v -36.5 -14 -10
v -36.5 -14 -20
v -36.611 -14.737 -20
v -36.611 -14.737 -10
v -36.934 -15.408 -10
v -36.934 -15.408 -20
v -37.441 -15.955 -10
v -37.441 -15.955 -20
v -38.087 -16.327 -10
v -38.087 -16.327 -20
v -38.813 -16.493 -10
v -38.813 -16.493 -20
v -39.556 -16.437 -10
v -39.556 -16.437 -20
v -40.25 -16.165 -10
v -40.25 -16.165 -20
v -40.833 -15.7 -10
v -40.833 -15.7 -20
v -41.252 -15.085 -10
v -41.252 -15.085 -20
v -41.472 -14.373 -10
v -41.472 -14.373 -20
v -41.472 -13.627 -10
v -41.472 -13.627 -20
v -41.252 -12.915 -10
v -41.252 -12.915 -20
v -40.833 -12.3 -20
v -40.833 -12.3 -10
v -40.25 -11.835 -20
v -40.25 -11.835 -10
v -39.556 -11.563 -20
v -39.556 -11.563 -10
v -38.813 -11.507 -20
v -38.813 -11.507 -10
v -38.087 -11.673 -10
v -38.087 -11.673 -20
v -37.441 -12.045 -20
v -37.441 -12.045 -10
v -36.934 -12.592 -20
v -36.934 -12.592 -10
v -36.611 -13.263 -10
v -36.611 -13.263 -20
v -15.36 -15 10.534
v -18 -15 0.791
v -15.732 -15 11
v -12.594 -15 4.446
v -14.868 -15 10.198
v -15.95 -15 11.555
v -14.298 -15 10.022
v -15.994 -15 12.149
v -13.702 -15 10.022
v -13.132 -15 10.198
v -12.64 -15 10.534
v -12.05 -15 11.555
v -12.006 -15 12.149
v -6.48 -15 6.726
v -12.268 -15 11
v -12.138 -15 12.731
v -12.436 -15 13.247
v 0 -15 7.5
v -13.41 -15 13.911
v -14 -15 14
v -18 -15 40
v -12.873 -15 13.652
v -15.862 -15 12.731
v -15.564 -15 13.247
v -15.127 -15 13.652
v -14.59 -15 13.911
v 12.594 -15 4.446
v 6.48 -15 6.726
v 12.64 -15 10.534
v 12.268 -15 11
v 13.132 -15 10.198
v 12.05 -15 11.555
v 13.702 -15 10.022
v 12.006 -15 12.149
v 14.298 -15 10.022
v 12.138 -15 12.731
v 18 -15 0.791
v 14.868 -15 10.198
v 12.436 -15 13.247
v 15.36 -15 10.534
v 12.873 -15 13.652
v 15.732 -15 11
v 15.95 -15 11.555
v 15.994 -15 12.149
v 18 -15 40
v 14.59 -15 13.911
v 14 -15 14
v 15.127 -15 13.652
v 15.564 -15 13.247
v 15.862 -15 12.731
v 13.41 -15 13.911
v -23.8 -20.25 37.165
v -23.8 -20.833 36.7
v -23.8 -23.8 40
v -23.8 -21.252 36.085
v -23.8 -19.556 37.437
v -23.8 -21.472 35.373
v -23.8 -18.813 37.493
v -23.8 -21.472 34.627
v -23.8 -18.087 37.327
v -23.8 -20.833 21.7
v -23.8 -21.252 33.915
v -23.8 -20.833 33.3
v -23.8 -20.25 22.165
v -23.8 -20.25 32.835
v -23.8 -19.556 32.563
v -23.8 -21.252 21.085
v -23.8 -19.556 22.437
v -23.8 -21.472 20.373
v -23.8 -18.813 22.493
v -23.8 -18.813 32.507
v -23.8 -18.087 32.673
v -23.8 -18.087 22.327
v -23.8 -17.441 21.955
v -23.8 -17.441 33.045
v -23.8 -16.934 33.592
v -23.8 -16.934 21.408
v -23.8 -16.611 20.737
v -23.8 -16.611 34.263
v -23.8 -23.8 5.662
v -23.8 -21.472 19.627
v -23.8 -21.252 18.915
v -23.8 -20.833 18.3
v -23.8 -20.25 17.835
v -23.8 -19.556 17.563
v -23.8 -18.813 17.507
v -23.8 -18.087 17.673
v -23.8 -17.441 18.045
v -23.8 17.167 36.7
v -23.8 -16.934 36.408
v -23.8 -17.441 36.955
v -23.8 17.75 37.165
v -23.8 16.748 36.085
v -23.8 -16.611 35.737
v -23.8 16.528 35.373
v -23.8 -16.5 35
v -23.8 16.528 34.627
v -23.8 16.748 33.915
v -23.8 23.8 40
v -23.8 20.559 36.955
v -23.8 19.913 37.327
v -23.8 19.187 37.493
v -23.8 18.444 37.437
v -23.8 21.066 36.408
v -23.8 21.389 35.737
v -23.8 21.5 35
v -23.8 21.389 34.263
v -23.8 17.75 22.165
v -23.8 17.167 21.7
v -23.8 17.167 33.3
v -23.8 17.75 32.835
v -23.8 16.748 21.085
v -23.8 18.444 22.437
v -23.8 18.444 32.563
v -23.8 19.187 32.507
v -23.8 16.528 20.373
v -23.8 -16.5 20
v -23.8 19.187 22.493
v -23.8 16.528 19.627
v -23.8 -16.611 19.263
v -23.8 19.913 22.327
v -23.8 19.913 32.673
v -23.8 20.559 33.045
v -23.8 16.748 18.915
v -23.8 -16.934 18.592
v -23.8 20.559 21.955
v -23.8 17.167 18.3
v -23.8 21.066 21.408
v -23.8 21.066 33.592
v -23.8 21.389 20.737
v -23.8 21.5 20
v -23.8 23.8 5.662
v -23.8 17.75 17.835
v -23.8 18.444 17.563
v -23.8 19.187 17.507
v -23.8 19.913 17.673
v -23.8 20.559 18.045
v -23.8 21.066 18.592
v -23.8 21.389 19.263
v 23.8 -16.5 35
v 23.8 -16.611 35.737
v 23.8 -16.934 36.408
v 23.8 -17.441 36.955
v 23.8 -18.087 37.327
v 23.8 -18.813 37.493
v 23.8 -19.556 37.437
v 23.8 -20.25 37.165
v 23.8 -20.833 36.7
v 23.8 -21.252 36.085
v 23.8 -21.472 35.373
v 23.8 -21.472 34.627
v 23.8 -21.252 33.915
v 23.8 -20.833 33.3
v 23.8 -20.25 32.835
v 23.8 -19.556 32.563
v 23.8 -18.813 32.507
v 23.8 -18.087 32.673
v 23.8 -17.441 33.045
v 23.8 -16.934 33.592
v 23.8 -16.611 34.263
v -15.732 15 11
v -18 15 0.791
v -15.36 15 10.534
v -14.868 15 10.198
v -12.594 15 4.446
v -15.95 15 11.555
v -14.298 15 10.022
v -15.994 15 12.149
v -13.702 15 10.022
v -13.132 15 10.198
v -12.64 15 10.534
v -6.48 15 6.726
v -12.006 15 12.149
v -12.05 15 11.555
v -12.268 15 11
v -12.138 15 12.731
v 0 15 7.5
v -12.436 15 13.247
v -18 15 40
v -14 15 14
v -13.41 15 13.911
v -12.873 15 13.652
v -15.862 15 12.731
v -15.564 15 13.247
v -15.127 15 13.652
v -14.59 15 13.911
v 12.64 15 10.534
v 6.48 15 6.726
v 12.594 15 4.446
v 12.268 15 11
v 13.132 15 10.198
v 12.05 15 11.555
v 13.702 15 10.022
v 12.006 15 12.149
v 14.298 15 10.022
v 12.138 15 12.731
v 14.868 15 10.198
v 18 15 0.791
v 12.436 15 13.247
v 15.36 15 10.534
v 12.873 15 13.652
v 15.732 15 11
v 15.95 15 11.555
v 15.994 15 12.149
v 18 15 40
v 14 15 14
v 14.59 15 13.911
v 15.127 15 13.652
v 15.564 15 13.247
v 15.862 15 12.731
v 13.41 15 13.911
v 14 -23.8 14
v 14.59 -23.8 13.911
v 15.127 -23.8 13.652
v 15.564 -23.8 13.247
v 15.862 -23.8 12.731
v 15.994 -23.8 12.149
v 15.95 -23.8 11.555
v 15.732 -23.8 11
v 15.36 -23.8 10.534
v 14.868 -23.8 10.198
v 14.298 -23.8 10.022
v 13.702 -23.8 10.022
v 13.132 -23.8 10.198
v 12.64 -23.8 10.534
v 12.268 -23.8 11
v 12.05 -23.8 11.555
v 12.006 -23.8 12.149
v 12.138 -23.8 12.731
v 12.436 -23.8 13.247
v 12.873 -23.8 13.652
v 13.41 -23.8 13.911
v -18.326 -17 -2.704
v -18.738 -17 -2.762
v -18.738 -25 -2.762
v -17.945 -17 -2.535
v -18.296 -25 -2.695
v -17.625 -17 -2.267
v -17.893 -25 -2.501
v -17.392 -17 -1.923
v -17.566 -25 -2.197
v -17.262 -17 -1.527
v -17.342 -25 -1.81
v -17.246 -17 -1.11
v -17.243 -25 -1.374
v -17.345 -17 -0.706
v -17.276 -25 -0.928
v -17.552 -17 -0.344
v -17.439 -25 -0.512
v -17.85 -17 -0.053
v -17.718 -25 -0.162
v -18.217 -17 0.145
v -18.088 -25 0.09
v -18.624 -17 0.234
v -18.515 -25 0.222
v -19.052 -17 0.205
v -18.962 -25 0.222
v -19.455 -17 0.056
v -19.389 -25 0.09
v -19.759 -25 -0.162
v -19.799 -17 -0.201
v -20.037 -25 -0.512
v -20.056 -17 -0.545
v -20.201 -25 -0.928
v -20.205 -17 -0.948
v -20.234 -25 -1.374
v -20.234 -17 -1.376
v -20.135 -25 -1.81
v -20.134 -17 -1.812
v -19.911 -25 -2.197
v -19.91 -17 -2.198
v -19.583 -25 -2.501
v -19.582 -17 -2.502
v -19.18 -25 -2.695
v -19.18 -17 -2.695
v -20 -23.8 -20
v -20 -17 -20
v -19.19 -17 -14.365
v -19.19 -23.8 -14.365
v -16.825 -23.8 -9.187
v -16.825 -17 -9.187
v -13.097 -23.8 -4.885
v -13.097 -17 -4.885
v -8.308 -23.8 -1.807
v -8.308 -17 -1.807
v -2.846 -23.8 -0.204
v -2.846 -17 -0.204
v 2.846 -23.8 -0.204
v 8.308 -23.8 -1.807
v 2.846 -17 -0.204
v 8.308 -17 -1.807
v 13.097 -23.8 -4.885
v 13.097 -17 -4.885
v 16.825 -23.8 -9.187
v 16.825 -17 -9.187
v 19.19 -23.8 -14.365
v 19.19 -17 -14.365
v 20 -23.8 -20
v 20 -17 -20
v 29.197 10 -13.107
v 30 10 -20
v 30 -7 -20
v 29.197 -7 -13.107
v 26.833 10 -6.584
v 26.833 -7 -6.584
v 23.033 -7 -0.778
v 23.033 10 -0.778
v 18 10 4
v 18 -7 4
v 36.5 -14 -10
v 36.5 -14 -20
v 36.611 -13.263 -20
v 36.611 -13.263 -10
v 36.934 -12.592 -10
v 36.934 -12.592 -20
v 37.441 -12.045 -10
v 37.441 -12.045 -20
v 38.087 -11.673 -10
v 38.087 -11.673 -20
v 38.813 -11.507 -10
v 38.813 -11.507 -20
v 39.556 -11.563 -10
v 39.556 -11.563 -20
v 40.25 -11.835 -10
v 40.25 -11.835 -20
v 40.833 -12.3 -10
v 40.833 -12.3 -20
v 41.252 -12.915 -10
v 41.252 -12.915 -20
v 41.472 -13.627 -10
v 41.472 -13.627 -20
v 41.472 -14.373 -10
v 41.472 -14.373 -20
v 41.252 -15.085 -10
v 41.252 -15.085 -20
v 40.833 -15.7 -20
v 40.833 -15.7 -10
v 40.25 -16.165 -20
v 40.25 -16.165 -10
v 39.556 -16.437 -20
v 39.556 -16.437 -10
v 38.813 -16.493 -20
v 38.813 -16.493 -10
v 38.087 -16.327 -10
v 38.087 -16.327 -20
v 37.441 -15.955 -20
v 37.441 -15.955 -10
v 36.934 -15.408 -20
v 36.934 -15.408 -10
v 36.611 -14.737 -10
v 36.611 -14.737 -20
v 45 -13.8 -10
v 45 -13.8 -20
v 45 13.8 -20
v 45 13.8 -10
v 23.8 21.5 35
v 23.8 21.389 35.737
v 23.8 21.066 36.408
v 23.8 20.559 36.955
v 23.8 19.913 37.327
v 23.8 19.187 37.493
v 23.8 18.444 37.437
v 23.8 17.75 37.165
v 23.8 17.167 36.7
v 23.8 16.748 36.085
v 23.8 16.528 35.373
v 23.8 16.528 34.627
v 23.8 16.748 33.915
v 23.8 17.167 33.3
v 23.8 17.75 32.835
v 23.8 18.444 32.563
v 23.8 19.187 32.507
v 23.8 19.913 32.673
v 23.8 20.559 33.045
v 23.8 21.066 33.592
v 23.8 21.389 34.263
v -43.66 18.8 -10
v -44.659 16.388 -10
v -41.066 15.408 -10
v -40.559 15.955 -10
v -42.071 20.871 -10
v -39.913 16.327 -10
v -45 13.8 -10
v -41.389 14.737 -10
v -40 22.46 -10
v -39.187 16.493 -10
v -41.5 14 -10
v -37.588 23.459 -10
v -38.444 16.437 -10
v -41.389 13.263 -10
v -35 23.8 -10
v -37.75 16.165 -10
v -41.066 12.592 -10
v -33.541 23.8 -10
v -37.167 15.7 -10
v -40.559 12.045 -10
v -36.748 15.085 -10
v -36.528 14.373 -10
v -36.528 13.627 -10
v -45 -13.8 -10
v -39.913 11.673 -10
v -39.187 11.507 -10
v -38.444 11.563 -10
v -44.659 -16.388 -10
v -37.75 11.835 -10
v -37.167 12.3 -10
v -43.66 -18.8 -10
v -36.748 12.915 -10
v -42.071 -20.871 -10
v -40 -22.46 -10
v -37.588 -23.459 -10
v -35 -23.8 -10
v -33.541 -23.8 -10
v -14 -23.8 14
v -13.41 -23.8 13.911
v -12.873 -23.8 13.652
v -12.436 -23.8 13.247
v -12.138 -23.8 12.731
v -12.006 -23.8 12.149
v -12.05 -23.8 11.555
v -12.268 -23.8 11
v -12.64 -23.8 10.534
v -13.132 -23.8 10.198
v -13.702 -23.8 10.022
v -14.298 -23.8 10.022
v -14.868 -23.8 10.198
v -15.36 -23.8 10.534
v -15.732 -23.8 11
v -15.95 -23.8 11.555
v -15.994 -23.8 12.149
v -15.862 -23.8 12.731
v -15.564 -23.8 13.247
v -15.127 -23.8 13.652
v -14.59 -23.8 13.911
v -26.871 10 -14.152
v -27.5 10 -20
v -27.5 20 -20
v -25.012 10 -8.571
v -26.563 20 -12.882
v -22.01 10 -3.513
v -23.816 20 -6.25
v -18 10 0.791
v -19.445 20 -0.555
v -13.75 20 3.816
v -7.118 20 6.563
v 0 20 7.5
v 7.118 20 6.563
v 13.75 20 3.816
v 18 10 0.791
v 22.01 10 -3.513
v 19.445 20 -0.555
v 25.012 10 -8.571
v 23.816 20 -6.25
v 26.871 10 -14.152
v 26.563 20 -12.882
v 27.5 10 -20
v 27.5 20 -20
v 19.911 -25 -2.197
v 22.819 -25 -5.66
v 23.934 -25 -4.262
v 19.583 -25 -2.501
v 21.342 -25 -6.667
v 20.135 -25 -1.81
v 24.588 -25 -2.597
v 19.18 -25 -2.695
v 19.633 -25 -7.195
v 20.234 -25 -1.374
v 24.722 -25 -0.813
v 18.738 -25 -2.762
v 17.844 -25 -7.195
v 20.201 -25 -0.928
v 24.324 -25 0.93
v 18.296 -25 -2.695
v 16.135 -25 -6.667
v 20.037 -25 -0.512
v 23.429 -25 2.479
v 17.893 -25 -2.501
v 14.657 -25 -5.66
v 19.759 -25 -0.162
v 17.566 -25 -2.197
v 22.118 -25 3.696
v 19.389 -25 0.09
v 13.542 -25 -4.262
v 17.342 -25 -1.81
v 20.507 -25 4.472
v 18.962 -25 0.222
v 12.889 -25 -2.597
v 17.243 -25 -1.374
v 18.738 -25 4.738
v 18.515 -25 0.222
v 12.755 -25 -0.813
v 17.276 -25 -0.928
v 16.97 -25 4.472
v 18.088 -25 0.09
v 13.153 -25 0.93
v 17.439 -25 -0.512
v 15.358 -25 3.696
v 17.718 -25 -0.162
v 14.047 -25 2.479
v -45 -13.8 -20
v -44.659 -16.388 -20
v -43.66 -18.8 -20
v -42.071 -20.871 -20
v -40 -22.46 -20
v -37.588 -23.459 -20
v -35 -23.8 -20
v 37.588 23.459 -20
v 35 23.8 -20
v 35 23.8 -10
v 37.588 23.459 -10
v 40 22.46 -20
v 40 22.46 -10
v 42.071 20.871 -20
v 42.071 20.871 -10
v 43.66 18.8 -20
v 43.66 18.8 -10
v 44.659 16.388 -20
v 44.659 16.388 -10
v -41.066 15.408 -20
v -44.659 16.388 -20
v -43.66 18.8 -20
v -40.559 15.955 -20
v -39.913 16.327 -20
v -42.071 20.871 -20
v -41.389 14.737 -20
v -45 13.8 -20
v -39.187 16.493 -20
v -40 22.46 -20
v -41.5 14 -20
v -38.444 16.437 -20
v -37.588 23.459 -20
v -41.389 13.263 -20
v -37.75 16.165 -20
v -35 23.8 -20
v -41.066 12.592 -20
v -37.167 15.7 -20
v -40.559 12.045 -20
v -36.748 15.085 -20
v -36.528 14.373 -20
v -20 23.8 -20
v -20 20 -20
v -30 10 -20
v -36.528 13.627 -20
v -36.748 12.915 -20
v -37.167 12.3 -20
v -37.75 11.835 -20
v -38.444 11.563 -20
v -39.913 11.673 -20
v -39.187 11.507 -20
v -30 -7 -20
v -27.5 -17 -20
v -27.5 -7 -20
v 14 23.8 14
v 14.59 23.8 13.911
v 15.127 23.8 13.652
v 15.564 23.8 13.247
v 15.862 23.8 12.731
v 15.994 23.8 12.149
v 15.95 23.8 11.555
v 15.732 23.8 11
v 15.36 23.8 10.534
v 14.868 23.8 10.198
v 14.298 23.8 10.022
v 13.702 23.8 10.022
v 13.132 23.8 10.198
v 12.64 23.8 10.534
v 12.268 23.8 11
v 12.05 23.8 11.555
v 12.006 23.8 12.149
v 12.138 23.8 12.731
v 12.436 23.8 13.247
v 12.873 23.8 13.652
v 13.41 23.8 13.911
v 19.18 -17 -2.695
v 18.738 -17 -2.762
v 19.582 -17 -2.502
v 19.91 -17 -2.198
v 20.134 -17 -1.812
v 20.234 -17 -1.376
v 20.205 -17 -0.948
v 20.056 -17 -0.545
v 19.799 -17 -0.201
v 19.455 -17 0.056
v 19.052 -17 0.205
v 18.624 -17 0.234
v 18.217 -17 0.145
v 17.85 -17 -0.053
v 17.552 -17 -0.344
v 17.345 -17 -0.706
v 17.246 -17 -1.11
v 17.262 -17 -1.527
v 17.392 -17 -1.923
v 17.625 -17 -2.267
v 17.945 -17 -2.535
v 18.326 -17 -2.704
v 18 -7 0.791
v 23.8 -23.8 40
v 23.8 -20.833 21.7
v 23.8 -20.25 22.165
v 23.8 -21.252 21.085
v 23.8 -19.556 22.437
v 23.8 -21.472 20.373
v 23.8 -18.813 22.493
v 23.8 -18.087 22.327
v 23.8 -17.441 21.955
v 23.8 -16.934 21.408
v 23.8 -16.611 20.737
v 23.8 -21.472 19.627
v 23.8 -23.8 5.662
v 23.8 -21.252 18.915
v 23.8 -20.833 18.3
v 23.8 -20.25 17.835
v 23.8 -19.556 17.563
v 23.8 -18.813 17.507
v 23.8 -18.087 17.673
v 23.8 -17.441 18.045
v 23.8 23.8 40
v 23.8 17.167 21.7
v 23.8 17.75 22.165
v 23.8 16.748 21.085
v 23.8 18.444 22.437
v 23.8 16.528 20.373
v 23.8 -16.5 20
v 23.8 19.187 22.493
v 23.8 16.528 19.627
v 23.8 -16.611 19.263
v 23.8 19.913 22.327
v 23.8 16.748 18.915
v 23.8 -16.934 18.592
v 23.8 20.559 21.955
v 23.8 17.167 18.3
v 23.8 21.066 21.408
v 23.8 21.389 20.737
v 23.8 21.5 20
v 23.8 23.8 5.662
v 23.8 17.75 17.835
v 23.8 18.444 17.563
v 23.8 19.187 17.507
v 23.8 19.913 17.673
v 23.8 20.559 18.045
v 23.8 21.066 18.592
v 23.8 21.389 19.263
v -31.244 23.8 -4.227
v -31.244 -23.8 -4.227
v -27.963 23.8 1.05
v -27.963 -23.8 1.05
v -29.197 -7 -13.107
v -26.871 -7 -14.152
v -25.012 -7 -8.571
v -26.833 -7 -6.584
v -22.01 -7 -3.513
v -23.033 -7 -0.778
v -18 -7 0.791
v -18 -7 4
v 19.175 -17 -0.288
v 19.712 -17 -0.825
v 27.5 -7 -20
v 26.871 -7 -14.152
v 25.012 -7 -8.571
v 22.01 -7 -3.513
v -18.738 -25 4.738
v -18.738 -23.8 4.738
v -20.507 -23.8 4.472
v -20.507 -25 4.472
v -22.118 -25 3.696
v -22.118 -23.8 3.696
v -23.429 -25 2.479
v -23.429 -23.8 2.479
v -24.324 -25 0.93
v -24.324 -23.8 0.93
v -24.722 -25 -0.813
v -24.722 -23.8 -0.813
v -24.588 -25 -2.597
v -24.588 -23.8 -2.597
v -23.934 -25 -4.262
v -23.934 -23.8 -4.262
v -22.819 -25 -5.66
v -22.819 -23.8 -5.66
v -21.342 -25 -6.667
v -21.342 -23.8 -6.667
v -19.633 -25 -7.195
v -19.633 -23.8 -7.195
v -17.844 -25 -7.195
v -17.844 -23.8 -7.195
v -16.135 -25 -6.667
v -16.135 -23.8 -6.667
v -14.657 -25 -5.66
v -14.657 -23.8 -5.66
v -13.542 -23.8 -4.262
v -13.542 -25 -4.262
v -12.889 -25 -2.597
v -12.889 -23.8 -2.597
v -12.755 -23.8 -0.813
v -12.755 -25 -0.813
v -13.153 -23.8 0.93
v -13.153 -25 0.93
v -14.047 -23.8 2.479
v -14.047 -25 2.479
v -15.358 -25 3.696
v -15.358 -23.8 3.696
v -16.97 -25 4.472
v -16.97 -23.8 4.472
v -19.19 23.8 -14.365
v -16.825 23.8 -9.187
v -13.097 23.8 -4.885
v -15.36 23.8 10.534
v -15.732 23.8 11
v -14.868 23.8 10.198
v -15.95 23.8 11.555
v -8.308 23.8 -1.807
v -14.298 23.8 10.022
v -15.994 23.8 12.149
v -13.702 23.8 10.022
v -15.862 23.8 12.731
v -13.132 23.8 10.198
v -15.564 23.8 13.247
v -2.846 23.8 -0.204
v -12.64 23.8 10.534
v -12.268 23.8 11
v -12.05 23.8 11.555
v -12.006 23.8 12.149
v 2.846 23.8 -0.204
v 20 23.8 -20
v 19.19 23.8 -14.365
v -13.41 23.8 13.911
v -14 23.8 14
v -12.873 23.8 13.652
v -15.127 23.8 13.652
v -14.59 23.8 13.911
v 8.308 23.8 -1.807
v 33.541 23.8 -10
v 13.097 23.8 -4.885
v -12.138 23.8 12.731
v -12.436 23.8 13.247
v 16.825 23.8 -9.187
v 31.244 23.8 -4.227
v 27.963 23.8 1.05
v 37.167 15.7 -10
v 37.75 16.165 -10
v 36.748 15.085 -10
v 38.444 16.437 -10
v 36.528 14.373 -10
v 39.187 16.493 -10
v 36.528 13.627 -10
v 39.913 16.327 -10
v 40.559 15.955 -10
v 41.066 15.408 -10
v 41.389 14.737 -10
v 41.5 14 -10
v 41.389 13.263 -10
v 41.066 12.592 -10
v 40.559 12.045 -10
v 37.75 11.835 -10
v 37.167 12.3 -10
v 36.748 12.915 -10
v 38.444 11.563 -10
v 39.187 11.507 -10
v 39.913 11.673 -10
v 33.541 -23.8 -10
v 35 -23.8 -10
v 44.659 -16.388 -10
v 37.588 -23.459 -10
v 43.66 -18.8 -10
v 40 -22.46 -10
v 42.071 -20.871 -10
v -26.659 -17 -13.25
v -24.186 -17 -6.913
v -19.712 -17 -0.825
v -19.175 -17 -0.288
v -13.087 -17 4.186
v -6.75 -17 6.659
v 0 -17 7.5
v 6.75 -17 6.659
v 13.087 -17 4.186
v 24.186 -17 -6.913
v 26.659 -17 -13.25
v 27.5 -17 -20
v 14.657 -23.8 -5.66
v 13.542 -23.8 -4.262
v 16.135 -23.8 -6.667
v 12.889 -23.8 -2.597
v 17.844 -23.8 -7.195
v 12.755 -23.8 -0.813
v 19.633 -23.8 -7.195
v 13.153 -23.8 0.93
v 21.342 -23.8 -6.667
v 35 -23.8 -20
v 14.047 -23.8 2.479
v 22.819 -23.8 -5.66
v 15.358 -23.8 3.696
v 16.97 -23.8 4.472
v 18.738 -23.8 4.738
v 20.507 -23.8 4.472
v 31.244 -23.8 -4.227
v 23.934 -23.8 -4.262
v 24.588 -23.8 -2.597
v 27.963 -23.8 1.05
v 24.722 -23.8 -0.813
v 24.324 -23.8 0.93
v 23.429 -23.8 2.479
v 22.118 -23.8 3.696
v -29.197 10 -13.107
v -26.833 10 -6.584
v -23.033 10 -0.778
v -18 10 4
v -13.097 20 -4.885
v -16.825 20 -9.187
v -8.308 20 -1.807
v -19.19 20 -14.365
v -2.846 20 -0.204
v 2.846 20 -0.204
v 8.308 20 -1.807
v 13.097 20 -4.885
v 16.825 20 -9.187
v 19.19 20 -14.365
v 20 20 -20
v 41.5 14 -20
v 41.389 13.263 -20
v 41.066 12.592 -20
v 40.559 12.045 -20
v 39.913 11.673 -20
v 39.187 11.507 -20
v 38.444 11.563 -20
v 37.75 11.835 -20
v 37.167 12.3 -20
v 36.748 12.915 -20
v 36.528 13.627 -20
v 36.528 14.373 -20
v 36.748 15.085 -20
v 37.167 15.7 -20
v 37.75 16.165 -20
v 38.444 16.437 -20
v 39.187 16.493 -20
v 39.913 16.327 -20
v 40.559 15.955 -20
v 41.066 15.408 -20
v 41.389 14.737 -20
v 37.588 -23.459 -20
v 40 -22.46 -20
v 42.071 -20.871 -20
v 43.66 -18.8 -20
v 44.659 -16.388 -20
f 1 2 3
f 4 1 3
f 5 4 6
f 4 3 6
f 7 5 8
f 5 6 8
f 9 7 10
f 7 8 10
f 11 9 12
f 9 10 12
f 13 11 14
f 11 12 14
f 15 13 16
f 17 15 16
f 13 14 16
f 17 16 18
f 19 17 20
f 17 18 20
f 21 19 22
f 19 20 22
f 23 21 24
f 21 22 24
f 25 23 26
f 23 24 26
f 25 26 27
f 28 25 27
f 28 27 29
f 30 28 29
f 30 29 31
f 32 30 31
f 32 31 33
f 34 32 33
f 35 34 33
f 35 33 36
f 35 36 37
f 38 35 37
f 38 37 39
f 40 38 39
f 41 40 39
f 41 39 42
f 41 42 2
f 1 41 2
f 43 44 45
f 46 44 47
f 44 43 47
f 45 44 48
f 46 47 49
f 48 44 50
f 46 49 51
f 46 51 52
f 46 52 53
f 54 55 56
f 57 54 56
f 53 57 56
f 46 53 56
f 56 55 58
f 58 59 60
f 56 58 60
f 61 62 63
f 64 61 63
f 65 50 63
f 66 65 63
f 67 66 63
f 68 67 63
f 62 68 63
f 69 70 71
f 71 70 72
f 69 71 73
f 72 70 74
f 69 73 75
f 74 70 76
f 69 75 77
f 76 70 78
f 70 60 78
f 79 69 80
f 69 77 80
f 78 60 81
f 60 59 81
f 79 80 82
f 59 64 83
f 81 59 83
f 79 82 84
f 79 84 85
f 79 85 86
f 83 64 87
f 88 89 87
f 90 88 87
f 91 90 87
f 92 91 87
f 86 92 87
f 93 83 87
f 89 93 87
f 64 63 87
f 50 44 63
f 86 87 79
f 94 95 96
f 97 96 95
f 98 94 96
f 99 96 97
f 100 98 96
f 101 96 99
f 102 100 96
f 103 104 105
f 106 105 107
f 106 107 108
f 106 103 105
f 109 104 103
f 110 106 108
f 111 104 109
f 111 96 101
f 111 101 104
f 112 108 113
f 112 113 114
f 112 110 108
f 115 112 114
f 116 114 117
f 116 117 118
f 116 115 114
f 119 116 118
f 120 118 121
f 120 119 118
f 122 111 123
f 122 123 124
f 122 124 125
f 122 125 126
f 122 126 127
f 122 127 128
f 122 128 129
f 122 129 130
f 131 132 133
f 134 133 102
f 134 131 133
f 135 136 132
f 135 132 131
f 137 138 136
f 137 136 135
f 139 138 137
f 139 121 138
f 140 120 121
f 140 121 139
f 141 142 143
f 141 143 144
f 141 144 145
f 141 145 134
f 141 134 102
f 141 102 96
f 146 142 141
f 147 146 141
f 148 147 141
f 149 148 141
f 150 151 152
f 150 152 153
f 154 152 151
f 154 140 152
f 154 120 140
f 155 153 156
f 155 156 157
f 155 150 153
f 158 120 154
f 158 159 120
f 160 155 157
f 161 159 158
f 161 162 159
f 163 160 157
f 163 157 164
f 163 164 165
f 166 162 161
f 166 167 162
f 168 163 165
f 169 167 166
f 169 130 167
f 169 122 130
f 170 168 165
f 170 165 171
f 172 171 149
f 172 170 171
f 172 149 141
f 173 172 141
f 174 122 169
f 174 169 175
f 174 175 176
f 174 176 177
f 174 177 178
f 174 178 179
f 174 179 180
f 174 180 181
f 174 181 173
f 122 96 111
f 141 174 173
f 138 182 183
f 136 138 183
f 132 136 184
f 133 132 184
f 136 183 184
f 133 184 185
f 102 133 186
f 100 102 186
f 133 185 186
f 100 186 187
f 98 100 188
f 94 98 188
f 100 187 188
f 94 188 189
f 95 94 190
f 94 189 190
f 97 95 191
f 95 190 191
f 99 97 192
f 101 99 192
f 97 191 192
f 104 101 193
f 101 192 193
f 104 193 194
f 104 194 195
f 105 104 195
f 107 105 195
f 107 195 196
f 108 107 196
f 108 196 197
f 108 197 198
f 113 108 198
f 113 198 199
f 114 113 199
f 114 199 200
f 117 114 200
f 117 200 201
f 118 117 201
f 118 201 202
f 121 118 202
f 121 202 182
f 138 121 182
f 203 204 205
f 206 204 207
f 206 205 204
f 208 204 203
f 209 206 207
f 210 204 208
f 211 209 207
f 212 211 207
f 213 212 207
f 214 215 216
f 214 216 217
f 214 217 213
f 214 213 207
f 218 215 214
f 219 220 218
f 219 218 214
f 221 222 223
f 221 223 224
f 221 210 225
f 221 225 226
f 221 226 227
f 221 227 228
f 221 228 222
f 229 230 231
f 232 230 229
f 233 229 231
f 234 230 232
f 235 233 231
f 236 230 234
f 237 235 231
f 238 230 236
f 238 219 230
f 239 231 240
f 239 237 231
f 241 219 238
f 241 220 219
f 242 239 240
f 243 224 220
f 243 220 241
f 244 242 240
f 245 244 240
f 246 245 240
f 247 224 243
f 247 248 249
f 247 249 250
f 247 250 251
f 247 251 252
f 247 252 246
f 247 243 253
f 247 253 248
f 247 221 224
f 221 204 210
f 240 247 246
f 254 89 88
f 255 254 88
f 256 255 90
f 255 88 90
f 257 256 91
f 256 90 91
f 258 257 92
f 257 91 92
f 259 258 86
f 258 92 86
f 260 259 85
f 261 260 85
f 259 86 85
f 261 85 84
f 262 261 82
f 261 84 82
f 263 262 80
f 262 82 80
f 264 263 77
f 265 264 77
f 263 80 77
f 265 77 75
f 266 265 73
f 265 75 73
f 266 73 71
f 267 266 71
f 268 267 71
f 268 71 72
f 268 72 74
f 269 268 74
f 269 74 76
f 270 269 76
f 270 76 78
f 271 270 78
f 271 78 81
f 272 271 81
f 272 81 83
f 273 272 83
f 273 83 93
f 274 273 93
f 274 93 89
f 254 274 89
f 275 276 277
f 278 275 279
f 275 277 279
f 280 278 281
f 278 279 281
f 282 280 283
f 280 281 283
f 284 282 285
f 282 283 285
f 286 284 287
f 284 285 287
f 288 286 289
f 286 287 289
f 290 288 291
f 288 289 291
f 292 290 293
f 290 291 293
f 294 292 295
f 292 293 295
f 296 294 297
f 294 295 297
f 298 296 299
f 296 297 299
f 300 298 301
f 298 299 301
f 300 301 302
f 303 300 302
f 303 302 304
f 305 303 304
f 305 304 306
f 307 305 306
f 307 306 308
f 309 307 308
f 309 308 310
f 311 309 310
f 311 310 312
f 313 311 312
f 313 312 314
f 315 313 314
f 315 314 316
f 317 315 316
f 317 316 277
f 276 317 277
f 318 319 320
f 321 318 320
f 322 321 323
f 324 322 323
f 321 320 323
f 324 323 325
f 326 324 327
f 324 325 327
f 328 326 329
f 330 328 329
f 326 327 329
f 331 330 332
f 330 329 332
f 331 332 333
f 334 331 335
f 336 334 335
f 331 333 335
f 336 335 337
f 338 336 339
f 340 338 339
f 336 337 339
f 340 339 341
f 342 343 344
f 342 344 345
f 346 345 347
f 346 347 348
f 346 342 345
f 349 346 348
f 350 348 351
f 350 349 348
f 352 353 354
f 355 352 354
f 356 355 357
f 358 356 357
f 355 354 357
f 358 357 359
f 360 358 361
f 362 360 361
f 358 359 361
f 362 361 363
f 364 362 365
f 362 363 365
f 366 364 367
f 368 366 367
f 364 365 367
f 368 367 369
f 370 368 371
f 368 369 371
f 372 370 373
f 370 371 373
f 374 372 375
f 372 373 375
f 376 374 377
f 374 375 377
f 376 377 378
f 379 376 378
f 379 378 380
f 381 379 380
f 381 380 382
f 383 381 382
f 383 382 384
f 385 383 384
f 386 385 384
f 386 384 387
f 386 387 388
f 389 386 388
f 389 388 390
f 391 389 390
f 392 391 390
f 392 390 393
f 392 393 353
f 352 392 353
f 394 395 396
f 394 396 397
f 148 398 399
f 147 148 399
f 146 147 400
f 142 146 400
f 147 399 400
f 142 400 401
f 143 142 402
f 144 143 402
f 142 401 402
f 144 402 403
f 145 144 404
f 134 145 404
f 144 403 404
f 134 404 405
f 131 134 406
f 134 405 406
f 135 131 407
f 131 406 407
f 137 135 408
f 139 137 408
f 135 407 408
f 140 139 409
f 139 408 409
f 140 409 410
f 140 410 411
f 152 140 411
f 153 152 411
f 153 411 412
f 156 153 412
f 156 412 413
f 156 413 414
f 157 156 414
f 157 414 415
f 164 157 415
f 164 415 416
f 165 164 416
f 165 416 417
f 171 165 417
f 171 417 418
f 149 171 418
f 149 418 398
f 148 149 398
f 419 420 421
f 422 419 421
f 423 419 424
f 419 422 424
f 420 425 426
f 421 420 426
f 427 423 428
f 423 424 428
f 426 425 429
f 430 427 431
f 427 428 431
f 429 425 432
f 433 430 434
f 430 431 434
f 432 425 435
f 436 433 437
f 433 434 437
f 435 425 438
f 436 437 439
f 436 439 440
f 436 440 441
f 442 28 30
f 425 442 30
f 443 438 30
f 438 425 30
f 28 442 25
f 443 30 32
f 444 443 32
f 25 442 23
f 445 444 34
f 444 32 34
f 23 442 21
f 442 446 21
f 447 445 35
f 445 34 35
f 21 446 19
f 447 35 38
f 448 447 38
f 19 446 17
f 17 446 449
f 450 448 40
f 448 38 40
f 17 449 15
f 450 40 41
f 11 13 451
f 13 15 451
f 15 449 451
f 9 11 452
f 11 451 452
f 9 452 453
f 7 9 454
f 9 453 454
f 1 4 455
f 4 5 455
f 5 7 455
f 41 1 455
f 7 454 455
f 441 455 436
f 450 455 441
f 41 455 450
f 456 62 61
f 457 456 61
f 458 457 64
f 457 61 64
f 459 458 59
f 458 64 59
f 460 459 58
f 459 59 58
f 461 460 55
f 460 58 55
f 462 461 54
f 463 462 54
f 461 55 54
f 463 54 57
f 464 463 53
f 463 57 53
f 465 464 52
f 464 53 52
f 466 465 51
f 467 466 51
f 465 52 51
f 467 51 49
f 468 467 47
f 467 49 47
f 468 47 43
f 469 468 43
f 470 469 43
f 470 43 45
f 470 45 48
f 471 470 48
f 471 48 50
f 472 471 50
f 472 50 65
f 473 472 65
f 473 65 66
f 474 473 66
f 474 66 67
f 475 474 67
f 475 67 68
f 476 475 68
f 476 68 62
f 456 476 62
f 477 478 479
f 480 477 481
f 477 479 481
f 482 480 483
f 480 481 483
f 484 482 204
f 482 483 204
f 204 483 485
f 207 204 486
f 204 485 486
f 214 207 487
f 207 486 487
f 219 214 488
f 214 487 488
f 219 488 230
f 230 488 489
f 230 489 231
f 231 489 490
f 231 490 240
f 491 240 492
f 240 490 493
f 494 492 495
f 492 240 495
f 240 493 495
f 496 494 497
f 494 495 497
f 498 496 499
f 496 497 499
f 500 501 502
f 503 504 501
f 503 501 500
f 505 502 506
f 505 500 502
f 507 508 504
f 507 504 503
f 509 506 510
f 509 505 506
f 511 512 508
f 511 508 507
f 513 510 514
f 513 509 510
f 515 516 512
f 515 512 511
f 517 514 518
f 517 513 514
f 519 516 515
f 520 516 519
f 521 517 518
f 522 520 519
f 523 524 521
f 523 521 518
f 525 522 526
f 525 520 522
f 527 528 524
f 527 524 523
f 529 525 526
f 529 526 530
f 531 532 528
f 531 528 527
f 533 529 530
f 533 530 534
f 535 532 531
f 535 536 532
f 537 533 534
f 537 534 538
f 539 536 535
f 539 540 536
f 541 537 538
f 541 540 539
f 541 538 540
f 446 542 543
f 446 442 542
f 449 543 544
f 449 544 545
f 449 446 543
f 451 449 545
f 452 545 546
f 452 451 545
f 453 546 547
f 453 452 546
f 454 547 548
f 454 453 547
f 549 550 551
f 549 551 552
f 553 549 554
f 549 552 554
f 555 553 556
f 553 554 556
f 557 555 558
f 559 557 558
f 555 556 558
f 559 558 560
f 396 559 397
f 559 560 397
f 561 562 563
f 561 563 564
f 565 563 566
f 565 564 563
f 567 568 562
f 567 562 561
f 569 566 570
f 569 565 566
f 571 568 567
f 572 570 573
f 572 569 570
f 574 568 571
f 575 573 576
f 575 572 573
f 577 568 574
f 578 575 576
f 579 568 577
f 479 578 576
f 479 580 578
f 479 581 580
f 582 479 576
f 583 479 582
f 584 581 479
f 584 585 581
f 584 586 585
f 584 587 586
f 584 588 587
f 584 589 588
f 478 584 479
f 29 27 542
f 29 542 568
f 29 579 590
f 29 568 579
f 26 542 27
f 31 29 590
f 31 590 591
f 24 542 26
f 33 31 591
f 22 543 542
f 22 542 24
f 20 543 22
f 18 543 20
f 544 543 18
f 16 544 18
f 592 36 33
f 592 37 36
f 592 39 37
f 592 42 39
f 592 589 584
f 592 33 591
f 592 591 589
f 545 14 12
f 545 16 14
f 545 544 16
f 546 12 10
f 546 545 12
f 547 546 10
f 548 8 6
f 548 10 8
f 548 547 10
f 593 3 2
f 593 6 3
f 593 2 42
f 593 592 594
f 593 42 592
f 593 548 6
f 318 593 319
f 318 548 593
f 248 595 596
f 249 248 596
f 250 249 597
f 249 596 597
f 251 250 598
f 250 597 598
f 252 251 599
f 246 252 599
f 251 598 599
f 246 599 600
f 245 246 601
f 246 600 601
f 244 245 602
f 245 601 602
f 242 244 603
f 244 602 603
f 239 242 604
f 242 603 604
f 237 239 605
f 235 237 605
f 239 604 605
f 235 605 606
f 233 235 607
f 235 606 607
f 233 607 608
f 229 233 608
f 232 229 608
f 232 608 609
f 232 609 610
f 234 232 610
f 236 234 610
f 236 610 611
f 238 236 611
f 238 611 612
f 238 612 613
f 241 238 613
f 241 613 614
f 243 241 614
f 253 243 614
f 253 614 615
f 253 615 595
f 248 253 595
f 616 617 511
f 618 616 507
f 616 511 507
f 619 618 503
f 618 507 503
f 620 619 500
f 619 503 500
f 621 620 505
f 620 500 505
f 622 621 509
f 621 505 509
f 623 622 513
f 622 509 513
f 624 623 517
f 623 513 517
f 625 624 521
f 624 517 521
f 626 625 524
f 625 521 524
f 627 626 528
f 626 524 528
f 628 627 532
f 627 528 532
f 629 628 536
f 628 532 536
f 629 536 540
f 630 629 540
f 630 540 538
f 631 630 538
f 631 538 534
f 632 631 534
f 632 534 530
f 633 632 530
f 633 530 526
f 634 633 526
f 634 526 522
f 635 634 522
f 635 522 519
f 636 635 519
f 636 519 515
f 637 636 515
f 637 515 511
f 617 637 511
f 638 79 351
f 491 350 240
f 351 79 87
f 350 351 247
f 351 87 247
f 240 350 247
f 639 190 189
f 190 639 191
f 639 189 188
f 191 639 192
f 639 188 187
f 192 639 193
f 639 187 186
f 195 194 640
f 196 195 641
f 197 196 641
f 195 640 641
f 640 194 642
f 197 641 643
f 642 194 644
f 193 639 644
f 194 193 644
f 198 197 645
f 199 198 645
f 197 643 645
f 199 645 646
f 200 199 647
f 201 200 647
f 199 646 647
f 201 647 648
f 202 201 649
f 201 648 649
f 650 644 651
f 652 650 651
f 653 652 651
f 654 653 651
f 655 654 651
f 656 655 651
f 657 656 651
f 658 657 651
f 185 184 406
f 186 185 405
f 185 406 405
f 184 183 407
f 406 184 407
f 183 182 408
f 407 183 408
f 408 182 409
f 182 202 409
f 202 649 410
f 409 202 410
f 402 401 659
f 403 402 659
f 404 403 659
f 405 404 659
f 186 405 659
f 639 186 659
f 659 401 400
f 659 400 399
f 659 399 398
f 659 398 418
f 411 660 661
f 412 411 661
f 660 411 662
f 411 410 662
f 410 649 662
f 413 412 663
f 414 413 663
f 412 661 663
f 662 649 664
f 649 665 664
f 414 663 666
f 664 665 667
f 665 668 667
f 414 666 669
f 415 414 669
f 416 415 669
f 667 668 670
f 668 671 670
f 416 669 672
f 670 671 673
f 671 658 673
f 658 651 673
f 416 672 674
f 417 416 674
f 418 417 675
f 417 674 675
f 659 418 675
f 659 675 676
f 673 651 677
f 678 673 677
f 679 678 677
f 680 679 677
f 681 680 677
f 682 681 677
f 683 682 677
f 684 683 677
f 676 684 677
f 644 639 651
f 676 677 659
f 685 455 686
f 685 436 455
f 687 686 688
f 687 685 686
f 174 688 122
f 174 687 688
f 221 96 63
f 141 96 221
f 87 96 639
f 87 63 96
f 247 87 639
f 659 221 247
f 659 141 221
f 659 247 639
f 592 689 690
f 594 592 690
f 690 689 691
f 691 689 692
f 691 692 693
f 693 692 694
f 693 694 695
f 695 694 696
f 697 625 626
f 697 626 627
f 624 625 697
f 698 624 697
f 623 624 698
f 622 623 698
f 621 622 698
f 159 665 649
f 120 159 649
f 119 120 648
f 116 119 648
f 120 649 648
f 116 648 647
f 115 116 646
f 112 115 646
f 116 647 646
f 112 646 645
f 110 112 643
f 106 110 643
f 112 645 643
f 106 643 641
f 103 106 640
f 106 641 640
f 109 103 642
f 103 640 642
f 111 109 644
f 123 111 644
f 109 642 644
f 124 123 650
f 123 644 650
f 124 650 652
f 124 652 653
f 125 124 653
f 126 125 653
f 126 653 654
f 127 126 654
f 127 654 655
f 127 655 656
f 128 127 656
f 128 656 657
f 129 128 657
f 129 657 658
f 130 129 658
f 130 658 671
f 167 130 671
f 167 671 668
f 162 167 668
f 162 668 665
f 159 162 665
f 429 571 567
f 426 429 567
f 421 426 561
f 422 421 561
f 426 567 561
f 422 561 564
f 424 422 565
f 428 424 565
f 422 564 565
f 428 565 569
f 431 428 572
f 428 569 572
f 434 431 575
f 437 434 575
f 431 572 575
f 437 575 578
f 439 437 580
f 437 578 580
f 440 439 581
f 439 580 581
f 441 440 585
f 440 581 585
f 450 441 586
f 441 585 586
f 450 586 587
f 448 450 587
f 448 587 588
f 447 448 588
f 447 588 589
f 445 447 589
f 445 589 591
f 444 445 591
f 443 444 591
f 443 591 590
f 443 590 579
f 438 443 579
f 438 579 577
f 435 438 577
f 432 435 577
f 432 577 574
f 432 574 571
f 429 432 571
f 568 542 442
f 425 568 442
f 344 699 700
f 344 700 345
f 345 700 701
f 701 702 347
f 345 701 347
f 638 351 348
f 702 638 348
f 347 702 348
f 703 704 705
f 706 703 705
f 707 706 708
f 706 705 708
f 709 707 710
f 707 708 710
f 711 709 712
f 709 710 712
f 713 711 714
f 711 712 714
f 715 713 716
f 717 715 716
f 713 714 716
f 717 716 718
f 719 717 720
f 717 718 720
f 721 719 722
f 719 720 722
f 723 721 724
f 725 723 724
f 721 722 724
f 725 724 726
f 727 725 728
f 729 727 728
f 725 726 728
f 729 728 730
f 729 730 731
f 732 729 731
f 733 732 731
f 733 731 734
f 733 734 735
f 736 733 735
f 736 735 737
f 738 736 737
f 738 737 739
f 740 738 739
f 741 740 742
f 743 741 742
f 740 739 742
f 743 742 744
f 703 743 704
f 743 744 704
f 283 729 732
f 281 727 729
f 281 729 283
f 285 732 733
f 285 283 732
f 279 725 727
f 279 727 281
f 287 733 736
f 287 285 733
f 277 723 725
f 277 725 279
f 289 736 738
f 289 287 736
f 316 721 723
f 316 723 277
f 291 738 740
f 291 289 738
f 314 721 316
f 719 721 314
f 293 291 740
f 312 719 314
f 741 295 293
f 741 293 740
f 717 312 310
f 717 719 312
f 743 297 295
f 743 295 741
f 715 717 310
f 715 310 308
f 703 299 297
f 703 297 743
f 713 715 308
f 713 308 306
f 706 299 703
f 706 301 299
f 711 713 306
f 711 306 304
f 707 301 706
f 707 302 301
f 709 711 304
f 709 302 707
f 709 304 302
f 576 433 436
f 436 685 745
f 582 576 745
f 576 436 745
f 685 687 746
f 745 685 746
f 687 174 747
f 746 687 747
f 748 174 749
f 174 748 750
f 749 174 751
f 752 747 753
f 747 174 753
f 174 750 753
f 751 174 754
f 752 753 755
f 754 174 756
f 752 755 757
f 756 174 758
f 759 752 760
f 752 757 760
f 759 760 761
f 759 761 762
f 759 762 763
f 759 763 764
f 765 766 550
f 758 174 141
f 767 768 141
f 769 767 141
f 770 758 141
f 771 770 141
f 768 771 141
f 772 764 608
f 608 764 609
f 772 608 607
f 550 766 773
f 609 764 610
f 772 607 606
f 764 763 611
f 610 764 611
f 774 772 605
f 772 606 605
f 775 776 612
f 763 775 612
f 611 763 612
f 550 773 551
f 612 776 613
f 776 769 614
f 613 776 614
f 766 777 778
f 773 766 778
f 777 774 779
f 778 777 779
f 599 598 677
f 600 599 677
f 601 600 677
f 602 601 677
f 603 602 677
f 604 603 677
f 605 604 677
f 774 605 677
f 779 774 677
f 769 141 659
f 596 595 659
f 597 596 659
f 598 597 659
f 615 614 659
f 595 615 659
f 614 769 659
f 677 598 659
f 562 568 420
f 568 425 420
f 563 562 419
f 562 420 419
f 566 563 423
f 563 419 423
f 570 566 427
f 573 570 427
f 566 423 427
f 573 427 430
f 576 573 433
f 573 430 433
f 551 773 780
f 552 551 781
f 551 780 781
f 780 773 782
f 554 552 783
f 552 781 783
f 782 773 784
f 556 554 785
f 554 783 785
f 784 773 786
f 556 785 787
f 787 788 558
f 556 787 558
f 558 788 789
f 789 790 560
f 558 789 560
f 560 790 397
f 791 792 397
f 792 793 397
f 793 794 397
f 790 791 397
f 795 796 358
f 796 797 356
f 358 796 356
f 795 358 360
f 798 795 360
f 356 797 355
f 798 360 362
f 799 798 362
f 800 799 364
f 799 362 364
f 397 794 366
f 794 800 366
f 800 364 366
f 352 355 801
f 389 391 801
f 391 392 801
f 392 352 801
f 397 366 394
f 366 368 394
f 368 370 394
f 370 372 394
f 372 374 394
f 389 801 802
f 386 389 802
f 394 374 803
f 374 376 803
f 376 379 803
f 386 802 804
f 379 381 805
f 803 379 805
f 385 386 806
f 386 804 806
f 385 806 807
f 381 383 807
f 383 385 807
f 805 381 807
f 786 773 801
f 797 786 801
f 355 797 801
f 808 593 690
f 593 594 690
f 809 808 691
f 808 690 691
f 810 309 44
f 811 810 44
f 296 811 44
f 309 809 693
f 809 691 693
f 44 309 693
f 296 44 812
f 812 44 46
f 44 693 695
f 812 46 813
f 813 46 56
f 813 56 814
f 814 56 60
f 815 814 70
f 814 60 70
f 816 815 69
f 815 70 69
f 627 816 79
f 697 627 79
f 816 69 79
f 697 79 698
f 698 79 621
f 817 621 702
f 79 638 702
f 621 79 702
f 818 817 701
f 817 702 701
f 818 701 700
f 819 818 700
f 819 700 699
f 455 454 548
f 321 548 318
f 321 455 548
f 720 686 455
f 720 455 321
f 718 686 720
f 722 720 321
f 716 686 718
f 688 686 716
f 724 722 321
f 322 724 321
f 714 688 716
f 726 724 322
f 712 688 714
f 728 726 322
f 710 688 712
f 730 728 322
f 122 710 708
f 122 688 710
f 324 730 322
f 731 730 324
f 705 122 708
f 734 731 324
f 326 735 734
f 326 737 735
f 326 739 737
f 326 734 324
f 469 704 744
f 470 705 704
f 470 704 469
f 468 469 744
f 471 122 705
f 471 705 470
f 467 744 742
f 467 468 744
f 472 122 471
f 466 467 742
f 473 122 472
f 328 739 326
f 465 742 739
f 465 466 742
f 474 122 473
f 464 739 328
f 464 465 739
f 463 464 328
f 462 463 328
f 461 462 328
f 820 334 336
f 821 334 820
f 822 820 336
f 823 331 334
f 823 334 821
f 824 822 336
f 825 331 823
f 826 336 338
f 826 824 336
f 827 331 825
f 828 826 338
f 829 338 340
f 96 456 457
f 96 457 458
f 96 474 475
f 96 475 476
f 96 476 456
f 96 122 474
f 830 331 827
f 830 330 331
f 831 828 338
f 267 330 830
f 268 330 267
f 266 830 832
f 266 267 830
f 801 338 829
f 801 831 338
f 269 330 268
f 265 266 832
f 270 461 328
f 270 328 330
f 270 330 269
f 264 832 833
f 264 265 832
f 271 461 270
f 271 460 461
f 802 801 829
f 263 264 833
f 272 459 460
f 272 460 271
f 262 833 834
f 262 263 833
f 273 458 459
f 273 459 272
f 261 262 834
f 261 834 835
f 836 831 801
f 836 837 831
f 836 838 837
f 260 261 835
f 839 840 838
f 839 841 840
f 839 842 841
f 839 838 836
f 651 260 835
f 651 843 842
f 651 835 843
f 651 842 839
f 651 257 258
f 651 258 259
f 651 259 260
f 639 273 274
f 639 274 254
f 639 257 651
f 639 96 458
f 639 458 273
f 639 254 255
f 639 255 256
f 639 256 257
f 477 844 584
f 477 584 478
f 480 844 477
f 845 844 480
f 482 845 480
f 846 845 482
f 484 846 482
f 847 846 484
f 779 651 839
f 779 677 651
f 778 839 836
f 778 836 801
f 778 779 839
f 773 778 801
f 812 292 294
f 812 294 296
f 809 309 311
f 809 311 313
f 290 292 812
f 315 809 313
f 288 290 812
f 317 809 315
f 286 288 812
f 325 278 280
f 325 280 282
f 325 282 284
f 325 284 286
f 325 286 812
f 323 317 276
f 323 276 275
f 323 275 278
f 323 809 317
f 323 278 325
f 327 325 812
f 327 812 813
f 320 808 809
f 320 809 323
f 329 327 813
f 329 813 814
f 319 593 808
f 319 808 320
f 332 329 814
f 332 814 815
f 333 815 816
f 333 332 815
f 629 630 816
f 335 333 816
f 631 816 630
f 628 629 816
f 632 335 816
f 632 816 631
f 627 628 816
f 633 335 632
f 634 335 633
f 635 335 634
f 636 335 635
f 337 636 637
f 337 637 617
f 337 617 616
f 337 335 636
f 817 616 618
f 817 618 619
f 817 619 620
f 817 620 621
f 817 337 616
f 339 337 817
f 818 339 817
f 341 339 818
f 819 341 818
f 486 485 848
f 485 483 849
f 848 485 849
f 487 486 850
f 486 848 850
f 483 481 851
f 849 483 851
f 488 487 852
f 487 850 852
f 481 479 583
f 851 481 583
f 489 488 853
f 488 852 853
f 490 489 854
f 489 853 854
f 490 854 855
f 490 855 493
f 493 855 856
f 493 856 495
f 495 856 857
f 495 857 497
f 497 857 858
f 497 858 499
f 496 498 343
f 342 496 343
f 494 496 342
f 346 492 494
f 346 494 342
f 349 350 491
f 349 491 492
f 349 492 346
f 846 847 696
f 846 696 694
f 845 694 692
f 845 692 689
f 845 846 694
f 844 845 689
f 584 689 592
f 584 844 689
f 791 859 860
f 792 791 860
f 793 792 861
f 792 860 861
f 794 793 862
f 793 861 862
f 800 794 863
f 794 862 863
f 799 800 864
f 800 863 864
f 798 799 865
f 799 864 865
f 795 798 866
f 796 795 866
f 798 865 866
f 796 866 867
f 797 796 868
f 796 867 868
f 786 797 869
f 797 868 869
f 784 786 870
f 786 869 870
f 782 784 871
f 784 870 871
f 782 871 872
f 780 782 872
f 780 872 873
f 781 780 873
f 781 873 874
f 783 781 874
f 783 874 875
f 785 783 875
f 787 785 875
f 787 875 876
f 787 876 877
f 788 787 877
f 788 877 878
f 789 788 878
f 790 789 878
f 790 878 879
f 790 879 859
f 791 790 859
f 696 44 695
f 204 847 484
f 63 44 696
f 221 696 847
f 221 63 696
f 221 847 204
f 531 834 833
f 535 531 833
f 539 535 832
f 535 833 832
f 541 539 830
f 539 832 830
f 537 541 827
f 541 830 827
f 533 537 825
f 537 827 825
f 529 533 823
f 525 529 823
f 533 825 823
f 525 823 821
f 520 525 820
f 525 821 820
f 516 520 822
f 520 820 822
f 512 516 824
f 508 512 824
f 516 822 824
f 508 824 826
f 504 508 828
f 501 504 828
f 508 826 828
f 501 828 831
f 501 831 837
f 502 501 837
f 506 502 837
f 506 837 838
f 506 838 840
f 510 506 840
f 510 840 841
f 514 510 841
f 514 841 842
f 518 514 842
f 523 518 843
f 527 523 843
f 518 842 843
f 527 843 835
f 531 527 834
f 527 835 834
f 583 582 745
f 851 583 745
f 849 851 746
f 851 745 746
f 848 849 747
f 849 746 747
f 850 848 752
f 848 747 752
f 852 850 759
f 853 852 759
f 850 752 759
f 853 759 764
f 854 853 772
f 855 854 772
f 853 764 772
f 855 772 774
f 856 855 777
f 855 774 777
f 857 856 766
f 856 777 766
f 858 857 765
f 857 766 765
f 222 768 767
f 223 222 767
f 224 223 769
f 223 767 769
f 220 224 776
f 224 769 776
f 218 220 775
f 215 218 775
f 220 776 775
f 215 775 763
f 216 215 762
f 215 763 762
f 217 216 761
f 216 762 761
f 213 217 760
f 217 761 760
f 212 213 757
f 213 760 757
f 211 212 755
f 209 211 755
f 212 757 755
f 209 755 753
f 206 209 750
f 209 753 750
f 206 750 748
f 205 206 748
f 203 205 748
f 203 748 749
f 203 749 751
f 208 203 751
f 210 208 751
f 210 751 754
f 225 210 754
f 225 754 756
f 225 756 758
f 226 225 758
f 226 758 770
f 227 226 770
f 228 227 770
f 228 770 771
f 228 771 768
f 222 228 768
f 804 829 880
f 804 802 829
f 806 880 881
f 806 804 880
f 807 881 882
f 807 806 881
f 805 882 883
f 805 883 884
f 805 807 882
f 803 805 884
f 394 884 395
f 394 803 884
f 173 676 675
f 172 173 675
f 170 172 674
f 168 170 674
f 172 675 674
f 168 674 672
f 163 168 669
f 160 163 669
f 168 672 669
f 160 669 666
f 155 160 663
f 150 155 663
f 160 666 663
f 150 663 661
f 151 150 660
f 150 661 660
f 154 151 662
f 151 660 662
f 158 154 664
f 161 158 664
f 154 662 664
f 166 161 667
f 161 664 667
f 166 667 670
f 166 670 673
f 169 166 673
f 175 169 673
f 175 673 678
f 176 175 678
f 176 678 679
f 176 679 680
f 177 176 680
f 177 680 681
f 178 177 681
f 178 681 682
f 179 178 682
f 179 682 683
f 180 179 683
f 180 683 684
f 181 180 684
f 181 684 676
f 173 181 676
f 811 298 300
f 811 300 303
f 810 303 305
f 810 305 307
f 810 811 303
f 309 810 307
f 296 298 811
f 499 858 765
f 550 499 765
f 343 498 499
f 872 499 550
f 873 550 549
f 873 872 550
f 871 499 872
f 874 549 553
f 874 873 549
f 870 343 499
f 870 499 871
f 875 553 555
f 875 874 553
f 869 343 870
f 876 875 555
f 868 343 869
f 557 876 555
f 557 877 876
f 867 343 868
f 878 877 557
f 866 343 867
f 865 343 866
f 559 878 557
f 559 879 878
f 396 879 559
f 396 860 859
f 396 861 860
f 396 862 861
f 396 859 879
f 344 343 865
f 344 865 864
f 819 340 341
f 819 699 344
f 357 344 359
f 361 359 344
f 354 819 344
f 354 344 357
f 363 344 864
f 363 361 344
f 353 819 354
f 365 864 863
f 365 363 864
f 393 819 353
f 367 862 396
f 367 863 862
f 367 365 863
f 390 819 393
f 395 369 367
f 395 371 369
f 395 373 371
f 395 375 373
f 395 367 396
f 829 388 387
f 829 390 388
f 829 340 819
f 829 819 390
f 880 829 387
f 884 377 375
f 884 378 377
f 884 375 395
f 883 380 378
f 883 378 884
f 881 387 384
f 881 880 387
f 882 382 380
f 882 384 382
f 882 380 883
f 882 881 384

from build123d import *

# Parameters (mm, degrees)
CROQUIS1_W              = 47.6
CROQUIS1_H              = 47.6
SALIENTE_EXTRUIR1_DEPTH = 40
CROQUIS3_R              = 35
SALIENTE_EXTRUIR2_DEPTH = 47.6
CROQUIS4_W              = 80
CROQUIS4_H              = 40
CORTAR_EXTRUIR1_DEPTH   = 81.72025768
CROQUIS9_W              = 90
CROQUIS9_H              = 10
SALIENTE_EXTRUIR3_DEPTH = 47.6
CORTAR_EXTRUIR2_START   = -3.8
CROQUIS5_R              = 27.5
CORTAR_EXTRUIR2_DEPTH   = 37
CROQUIS6_W              = 36
CROQUIS6_H              = 30
CORTAR_EXTRUIR3_DEPTH   = 79.685703911
CORTAR_EXTRUIR4_START   = 10
CROQUIS7_R              = 30
CORTAR_EXTRUIR4_DEPTH   = 17
CROQUIS8_R              = 2.5
CORTAR_EXTRUIR5_DEPTH   = 84.065516311
CROQUIS11_R             = 2.5
CORTAR_EXTRUIR7_DEPTH   = 79.685703911
REDONDEO1_R             = 10
CROQUIS10_R             = 20
CORTAR_EXTRUIR6_DEPTH   = 77.751286634
CROQUIS13_R             = 2
CORTAR_EXTRUIR8_DEPTH   = 77.751286634
CROQUIS14_R             = 6
SALIENTE_EXTRUIR4_DEPTH = 1.2
CROQUIS15_R             = 1.5
CORTAR_EXTRUIR9_DEPTH   = 8


with BuildPart() as part:
    # Croquis1 → Saliente-Extruir1 (new body)
    with BuildSketch(Plane.XY):
        Rectangle(CROQUIS1_W, CROQUIS1_H)
    extrude(amount=SALIENTE_EXTRUIR1_DEPTH)

    # Croquis3 → Saliente-Extruir2 (add)
    with BuildSketch(Plane(origin=(0, 23.8, 0), x_dir=(1, 0, 0), z_dir=(0, 1, 0))):
        with Locations((0, 20)):
            Circle(CROQUIS3_R)
    extrude(amount=-SALIENTE_EXTRUIR2_DEPTH)

    # Croquis4 → Cortar-Extruir1 (cut, through all)
    with BuildSketch(Plane(origin=(0, 23.8, 0), x_dir=(1, 0, 0), z_dir=(0, 1, 0))):
        with Locations((0.60144352, 40)):
            Rectangle(CROQUIS4_W, CROQUIS4_H)
    extrude(amount=-CORTAR_EXTRUIR1_DEPTH, mode=Mode.SUBTRACT)

    # Croquis9 → Saliente-Extruir3 (add)
    with BuildSketch(Plane.XZ.offset(23.8)):
        with Locations((0, -15)):
            Rectangle(CROQUIS9_W, CROQUIS9_H)
    extrude(amount=-SALIENTE_EXTRUIR3_DEPTH)

    # Croquis5 → Cortar-Extruir2 (cut)
    with BuildSketch(Plane(origin=(0, 23.8, 0), x_dir=(1, 0, 0), z_dir=(0, 1, 0)).offset(CORTAR_EXTRUIR2_START)):
        with Locations((0, 20)):
            Circle(CROQUIS5_R)
    extrude(amount=-CORTAR_EXTRUIR2_DEPTH, mode=Mode.SUBTRACT)

    # Croquis6 → Cortar-Extruir3 (cut, through all)
    with BuildSketch(Plane.XY.offset(40)):
        Rectangle(CROQUIS6_W, CROQUIS6_H)
    extrude(amount=-CORTAR_EXTRUIR3_DEPTH, mode=Mode.SUBTRACT)

    # Croquis7 → Cortar-Extruir4 (cut)
    with BuildSketch(Plane.XZ.offset(-20).offset(CORTAR_EXTRUIR4_START)):
        with Locations((0, -20)):
            Circle(CROQUIS7_R)
    extrude(amount=CORTAR_EXTRUIR4_DEPTH, mode=Mode.SUBTRACT)

    # Croquis8 → Cortar-Extruir5 (cut, through all)
    with BuildSketch(Plane(origin=(23.8, 0, 0), x_dir=(0, 0, -1), z_dir=(1, 0, 0))):
        with Locations(Location((-35, 19, 0), (0, 0, 90))):
            Circle(CROQUIS8_R)
        with Locations(Location((-20, 19, 0), (0, 0, 90))):
            Circle(CROQUIS8_R)
        with Locations(Location((-20, -19, 0), (0, 0, 90))):
            Circle(CROQUIS8_R)
        with Locations(Location((-35, -19, 0), (0, 0, 90))):
            Circle(CROQUIS8_R)
    extrude(amount=-CORTAR_EXTRUIR5_DEPTH, mode=Mode.SUBTRACT)

    # Croquis11 → Cortar-Extruir7 (cut, through all)
    with BuildSketch(Plane(origin=(0, 0, -20), x_dir=(-1, 0, 0), z_dir=(0, 0, -1))):
        with Locations((39, 14)):
            Circle(CROQUIS11_R)
        with Locations(Location((39, -14, 0), (0, 0, 180))):
            Circle(CROQUIS11_R)
        with Locations((-39, -14)):
            Circle(CROQUIS11_R)
        with Locations(Location((-39, 14, 0), (0, 0, 180))):
            Circle(CROQUIS11_R)
    extrude(amount=-CORTAR_EXTRUIR7_DEPTH, mode=Mode.SUBTRACT)

    # Redondeo1
    redondeo1_edges = [part.edges().sort_by_distance(p)[0] for p in [
        (45, -23.8, -15),
        (-45, 23.8, -15),
        (45, 23.8, -15),
        (-45, -23.8, -15),
    ]]
    fillet(redondeo1_edges, radius=REDONDEO1_R)

    # Croquis10 → Cortar-Extruir6 (cut, through all)
    with BuildSketch(Plane(origin=(0, 23.8, 0), x_dir=(1, 0, 0), z_dir=(0, 1, 0))):
        with Locations((0, 20)):
            Circle(CROQUIS10_R)
    extrude(amount=-CORTAR_EXTRUIR6_DEPTH, mode=Mode.SUBTRACT)

    # Croquis13 → Cortar-Extruir8 (cut, through all)
    with BuildSketch(Plane(origin=(0, 23.8, 0), x_dir=(1, 0, 0), z_dir=(0, 1, 0))):
        with Locations(Location((-14, -12, 0), (0, 0, 270))):
            Circle(CROQUIS13_R)
        with Locations(Location((14, -12, 0), (0, 0, 270))):
            Circle(CROQUIS13_R)
    extrude(amount=-CORTAR_EXTRUIR8_DEPTH, mode=Mode.SUBTRACT)

    # Croquis14 → Saliente-Extruir4 (add)
    with BuildSketch(Plane.XZ.offset(23.8)):
        with Locations(Location((-18.738329701, -1.261670299, 0), (0, 0, 90))):
            Circle(CROQUIS14_R)
        with Locations(Location((18.738329701, -1.261670299, 0), (0, 0, 90))):
            Circle(CROQUIS14_R)
    extrude(amount=SALIENTE_EXTRUIR4_DEPTH)

    # Croquis15 → Cortar-Extruir9 (cut)
    with BuildSketch(Plane.XZ.offset(25)):
        with Locations(Location((18.738329701, -1.261670299, 0), (0, 0, 270))):
            Circle(CROQUIS15_R)
        with Locations(Location((-18.738329701, -1.261670299, 0), (0, 0, 270))):
            Circle(CROQUIS15_R)
    extrude(amount=-CORTAR_EXTRUIR9_DEPTH, mode=Mode.SUBTRACT)


solid = part.part
